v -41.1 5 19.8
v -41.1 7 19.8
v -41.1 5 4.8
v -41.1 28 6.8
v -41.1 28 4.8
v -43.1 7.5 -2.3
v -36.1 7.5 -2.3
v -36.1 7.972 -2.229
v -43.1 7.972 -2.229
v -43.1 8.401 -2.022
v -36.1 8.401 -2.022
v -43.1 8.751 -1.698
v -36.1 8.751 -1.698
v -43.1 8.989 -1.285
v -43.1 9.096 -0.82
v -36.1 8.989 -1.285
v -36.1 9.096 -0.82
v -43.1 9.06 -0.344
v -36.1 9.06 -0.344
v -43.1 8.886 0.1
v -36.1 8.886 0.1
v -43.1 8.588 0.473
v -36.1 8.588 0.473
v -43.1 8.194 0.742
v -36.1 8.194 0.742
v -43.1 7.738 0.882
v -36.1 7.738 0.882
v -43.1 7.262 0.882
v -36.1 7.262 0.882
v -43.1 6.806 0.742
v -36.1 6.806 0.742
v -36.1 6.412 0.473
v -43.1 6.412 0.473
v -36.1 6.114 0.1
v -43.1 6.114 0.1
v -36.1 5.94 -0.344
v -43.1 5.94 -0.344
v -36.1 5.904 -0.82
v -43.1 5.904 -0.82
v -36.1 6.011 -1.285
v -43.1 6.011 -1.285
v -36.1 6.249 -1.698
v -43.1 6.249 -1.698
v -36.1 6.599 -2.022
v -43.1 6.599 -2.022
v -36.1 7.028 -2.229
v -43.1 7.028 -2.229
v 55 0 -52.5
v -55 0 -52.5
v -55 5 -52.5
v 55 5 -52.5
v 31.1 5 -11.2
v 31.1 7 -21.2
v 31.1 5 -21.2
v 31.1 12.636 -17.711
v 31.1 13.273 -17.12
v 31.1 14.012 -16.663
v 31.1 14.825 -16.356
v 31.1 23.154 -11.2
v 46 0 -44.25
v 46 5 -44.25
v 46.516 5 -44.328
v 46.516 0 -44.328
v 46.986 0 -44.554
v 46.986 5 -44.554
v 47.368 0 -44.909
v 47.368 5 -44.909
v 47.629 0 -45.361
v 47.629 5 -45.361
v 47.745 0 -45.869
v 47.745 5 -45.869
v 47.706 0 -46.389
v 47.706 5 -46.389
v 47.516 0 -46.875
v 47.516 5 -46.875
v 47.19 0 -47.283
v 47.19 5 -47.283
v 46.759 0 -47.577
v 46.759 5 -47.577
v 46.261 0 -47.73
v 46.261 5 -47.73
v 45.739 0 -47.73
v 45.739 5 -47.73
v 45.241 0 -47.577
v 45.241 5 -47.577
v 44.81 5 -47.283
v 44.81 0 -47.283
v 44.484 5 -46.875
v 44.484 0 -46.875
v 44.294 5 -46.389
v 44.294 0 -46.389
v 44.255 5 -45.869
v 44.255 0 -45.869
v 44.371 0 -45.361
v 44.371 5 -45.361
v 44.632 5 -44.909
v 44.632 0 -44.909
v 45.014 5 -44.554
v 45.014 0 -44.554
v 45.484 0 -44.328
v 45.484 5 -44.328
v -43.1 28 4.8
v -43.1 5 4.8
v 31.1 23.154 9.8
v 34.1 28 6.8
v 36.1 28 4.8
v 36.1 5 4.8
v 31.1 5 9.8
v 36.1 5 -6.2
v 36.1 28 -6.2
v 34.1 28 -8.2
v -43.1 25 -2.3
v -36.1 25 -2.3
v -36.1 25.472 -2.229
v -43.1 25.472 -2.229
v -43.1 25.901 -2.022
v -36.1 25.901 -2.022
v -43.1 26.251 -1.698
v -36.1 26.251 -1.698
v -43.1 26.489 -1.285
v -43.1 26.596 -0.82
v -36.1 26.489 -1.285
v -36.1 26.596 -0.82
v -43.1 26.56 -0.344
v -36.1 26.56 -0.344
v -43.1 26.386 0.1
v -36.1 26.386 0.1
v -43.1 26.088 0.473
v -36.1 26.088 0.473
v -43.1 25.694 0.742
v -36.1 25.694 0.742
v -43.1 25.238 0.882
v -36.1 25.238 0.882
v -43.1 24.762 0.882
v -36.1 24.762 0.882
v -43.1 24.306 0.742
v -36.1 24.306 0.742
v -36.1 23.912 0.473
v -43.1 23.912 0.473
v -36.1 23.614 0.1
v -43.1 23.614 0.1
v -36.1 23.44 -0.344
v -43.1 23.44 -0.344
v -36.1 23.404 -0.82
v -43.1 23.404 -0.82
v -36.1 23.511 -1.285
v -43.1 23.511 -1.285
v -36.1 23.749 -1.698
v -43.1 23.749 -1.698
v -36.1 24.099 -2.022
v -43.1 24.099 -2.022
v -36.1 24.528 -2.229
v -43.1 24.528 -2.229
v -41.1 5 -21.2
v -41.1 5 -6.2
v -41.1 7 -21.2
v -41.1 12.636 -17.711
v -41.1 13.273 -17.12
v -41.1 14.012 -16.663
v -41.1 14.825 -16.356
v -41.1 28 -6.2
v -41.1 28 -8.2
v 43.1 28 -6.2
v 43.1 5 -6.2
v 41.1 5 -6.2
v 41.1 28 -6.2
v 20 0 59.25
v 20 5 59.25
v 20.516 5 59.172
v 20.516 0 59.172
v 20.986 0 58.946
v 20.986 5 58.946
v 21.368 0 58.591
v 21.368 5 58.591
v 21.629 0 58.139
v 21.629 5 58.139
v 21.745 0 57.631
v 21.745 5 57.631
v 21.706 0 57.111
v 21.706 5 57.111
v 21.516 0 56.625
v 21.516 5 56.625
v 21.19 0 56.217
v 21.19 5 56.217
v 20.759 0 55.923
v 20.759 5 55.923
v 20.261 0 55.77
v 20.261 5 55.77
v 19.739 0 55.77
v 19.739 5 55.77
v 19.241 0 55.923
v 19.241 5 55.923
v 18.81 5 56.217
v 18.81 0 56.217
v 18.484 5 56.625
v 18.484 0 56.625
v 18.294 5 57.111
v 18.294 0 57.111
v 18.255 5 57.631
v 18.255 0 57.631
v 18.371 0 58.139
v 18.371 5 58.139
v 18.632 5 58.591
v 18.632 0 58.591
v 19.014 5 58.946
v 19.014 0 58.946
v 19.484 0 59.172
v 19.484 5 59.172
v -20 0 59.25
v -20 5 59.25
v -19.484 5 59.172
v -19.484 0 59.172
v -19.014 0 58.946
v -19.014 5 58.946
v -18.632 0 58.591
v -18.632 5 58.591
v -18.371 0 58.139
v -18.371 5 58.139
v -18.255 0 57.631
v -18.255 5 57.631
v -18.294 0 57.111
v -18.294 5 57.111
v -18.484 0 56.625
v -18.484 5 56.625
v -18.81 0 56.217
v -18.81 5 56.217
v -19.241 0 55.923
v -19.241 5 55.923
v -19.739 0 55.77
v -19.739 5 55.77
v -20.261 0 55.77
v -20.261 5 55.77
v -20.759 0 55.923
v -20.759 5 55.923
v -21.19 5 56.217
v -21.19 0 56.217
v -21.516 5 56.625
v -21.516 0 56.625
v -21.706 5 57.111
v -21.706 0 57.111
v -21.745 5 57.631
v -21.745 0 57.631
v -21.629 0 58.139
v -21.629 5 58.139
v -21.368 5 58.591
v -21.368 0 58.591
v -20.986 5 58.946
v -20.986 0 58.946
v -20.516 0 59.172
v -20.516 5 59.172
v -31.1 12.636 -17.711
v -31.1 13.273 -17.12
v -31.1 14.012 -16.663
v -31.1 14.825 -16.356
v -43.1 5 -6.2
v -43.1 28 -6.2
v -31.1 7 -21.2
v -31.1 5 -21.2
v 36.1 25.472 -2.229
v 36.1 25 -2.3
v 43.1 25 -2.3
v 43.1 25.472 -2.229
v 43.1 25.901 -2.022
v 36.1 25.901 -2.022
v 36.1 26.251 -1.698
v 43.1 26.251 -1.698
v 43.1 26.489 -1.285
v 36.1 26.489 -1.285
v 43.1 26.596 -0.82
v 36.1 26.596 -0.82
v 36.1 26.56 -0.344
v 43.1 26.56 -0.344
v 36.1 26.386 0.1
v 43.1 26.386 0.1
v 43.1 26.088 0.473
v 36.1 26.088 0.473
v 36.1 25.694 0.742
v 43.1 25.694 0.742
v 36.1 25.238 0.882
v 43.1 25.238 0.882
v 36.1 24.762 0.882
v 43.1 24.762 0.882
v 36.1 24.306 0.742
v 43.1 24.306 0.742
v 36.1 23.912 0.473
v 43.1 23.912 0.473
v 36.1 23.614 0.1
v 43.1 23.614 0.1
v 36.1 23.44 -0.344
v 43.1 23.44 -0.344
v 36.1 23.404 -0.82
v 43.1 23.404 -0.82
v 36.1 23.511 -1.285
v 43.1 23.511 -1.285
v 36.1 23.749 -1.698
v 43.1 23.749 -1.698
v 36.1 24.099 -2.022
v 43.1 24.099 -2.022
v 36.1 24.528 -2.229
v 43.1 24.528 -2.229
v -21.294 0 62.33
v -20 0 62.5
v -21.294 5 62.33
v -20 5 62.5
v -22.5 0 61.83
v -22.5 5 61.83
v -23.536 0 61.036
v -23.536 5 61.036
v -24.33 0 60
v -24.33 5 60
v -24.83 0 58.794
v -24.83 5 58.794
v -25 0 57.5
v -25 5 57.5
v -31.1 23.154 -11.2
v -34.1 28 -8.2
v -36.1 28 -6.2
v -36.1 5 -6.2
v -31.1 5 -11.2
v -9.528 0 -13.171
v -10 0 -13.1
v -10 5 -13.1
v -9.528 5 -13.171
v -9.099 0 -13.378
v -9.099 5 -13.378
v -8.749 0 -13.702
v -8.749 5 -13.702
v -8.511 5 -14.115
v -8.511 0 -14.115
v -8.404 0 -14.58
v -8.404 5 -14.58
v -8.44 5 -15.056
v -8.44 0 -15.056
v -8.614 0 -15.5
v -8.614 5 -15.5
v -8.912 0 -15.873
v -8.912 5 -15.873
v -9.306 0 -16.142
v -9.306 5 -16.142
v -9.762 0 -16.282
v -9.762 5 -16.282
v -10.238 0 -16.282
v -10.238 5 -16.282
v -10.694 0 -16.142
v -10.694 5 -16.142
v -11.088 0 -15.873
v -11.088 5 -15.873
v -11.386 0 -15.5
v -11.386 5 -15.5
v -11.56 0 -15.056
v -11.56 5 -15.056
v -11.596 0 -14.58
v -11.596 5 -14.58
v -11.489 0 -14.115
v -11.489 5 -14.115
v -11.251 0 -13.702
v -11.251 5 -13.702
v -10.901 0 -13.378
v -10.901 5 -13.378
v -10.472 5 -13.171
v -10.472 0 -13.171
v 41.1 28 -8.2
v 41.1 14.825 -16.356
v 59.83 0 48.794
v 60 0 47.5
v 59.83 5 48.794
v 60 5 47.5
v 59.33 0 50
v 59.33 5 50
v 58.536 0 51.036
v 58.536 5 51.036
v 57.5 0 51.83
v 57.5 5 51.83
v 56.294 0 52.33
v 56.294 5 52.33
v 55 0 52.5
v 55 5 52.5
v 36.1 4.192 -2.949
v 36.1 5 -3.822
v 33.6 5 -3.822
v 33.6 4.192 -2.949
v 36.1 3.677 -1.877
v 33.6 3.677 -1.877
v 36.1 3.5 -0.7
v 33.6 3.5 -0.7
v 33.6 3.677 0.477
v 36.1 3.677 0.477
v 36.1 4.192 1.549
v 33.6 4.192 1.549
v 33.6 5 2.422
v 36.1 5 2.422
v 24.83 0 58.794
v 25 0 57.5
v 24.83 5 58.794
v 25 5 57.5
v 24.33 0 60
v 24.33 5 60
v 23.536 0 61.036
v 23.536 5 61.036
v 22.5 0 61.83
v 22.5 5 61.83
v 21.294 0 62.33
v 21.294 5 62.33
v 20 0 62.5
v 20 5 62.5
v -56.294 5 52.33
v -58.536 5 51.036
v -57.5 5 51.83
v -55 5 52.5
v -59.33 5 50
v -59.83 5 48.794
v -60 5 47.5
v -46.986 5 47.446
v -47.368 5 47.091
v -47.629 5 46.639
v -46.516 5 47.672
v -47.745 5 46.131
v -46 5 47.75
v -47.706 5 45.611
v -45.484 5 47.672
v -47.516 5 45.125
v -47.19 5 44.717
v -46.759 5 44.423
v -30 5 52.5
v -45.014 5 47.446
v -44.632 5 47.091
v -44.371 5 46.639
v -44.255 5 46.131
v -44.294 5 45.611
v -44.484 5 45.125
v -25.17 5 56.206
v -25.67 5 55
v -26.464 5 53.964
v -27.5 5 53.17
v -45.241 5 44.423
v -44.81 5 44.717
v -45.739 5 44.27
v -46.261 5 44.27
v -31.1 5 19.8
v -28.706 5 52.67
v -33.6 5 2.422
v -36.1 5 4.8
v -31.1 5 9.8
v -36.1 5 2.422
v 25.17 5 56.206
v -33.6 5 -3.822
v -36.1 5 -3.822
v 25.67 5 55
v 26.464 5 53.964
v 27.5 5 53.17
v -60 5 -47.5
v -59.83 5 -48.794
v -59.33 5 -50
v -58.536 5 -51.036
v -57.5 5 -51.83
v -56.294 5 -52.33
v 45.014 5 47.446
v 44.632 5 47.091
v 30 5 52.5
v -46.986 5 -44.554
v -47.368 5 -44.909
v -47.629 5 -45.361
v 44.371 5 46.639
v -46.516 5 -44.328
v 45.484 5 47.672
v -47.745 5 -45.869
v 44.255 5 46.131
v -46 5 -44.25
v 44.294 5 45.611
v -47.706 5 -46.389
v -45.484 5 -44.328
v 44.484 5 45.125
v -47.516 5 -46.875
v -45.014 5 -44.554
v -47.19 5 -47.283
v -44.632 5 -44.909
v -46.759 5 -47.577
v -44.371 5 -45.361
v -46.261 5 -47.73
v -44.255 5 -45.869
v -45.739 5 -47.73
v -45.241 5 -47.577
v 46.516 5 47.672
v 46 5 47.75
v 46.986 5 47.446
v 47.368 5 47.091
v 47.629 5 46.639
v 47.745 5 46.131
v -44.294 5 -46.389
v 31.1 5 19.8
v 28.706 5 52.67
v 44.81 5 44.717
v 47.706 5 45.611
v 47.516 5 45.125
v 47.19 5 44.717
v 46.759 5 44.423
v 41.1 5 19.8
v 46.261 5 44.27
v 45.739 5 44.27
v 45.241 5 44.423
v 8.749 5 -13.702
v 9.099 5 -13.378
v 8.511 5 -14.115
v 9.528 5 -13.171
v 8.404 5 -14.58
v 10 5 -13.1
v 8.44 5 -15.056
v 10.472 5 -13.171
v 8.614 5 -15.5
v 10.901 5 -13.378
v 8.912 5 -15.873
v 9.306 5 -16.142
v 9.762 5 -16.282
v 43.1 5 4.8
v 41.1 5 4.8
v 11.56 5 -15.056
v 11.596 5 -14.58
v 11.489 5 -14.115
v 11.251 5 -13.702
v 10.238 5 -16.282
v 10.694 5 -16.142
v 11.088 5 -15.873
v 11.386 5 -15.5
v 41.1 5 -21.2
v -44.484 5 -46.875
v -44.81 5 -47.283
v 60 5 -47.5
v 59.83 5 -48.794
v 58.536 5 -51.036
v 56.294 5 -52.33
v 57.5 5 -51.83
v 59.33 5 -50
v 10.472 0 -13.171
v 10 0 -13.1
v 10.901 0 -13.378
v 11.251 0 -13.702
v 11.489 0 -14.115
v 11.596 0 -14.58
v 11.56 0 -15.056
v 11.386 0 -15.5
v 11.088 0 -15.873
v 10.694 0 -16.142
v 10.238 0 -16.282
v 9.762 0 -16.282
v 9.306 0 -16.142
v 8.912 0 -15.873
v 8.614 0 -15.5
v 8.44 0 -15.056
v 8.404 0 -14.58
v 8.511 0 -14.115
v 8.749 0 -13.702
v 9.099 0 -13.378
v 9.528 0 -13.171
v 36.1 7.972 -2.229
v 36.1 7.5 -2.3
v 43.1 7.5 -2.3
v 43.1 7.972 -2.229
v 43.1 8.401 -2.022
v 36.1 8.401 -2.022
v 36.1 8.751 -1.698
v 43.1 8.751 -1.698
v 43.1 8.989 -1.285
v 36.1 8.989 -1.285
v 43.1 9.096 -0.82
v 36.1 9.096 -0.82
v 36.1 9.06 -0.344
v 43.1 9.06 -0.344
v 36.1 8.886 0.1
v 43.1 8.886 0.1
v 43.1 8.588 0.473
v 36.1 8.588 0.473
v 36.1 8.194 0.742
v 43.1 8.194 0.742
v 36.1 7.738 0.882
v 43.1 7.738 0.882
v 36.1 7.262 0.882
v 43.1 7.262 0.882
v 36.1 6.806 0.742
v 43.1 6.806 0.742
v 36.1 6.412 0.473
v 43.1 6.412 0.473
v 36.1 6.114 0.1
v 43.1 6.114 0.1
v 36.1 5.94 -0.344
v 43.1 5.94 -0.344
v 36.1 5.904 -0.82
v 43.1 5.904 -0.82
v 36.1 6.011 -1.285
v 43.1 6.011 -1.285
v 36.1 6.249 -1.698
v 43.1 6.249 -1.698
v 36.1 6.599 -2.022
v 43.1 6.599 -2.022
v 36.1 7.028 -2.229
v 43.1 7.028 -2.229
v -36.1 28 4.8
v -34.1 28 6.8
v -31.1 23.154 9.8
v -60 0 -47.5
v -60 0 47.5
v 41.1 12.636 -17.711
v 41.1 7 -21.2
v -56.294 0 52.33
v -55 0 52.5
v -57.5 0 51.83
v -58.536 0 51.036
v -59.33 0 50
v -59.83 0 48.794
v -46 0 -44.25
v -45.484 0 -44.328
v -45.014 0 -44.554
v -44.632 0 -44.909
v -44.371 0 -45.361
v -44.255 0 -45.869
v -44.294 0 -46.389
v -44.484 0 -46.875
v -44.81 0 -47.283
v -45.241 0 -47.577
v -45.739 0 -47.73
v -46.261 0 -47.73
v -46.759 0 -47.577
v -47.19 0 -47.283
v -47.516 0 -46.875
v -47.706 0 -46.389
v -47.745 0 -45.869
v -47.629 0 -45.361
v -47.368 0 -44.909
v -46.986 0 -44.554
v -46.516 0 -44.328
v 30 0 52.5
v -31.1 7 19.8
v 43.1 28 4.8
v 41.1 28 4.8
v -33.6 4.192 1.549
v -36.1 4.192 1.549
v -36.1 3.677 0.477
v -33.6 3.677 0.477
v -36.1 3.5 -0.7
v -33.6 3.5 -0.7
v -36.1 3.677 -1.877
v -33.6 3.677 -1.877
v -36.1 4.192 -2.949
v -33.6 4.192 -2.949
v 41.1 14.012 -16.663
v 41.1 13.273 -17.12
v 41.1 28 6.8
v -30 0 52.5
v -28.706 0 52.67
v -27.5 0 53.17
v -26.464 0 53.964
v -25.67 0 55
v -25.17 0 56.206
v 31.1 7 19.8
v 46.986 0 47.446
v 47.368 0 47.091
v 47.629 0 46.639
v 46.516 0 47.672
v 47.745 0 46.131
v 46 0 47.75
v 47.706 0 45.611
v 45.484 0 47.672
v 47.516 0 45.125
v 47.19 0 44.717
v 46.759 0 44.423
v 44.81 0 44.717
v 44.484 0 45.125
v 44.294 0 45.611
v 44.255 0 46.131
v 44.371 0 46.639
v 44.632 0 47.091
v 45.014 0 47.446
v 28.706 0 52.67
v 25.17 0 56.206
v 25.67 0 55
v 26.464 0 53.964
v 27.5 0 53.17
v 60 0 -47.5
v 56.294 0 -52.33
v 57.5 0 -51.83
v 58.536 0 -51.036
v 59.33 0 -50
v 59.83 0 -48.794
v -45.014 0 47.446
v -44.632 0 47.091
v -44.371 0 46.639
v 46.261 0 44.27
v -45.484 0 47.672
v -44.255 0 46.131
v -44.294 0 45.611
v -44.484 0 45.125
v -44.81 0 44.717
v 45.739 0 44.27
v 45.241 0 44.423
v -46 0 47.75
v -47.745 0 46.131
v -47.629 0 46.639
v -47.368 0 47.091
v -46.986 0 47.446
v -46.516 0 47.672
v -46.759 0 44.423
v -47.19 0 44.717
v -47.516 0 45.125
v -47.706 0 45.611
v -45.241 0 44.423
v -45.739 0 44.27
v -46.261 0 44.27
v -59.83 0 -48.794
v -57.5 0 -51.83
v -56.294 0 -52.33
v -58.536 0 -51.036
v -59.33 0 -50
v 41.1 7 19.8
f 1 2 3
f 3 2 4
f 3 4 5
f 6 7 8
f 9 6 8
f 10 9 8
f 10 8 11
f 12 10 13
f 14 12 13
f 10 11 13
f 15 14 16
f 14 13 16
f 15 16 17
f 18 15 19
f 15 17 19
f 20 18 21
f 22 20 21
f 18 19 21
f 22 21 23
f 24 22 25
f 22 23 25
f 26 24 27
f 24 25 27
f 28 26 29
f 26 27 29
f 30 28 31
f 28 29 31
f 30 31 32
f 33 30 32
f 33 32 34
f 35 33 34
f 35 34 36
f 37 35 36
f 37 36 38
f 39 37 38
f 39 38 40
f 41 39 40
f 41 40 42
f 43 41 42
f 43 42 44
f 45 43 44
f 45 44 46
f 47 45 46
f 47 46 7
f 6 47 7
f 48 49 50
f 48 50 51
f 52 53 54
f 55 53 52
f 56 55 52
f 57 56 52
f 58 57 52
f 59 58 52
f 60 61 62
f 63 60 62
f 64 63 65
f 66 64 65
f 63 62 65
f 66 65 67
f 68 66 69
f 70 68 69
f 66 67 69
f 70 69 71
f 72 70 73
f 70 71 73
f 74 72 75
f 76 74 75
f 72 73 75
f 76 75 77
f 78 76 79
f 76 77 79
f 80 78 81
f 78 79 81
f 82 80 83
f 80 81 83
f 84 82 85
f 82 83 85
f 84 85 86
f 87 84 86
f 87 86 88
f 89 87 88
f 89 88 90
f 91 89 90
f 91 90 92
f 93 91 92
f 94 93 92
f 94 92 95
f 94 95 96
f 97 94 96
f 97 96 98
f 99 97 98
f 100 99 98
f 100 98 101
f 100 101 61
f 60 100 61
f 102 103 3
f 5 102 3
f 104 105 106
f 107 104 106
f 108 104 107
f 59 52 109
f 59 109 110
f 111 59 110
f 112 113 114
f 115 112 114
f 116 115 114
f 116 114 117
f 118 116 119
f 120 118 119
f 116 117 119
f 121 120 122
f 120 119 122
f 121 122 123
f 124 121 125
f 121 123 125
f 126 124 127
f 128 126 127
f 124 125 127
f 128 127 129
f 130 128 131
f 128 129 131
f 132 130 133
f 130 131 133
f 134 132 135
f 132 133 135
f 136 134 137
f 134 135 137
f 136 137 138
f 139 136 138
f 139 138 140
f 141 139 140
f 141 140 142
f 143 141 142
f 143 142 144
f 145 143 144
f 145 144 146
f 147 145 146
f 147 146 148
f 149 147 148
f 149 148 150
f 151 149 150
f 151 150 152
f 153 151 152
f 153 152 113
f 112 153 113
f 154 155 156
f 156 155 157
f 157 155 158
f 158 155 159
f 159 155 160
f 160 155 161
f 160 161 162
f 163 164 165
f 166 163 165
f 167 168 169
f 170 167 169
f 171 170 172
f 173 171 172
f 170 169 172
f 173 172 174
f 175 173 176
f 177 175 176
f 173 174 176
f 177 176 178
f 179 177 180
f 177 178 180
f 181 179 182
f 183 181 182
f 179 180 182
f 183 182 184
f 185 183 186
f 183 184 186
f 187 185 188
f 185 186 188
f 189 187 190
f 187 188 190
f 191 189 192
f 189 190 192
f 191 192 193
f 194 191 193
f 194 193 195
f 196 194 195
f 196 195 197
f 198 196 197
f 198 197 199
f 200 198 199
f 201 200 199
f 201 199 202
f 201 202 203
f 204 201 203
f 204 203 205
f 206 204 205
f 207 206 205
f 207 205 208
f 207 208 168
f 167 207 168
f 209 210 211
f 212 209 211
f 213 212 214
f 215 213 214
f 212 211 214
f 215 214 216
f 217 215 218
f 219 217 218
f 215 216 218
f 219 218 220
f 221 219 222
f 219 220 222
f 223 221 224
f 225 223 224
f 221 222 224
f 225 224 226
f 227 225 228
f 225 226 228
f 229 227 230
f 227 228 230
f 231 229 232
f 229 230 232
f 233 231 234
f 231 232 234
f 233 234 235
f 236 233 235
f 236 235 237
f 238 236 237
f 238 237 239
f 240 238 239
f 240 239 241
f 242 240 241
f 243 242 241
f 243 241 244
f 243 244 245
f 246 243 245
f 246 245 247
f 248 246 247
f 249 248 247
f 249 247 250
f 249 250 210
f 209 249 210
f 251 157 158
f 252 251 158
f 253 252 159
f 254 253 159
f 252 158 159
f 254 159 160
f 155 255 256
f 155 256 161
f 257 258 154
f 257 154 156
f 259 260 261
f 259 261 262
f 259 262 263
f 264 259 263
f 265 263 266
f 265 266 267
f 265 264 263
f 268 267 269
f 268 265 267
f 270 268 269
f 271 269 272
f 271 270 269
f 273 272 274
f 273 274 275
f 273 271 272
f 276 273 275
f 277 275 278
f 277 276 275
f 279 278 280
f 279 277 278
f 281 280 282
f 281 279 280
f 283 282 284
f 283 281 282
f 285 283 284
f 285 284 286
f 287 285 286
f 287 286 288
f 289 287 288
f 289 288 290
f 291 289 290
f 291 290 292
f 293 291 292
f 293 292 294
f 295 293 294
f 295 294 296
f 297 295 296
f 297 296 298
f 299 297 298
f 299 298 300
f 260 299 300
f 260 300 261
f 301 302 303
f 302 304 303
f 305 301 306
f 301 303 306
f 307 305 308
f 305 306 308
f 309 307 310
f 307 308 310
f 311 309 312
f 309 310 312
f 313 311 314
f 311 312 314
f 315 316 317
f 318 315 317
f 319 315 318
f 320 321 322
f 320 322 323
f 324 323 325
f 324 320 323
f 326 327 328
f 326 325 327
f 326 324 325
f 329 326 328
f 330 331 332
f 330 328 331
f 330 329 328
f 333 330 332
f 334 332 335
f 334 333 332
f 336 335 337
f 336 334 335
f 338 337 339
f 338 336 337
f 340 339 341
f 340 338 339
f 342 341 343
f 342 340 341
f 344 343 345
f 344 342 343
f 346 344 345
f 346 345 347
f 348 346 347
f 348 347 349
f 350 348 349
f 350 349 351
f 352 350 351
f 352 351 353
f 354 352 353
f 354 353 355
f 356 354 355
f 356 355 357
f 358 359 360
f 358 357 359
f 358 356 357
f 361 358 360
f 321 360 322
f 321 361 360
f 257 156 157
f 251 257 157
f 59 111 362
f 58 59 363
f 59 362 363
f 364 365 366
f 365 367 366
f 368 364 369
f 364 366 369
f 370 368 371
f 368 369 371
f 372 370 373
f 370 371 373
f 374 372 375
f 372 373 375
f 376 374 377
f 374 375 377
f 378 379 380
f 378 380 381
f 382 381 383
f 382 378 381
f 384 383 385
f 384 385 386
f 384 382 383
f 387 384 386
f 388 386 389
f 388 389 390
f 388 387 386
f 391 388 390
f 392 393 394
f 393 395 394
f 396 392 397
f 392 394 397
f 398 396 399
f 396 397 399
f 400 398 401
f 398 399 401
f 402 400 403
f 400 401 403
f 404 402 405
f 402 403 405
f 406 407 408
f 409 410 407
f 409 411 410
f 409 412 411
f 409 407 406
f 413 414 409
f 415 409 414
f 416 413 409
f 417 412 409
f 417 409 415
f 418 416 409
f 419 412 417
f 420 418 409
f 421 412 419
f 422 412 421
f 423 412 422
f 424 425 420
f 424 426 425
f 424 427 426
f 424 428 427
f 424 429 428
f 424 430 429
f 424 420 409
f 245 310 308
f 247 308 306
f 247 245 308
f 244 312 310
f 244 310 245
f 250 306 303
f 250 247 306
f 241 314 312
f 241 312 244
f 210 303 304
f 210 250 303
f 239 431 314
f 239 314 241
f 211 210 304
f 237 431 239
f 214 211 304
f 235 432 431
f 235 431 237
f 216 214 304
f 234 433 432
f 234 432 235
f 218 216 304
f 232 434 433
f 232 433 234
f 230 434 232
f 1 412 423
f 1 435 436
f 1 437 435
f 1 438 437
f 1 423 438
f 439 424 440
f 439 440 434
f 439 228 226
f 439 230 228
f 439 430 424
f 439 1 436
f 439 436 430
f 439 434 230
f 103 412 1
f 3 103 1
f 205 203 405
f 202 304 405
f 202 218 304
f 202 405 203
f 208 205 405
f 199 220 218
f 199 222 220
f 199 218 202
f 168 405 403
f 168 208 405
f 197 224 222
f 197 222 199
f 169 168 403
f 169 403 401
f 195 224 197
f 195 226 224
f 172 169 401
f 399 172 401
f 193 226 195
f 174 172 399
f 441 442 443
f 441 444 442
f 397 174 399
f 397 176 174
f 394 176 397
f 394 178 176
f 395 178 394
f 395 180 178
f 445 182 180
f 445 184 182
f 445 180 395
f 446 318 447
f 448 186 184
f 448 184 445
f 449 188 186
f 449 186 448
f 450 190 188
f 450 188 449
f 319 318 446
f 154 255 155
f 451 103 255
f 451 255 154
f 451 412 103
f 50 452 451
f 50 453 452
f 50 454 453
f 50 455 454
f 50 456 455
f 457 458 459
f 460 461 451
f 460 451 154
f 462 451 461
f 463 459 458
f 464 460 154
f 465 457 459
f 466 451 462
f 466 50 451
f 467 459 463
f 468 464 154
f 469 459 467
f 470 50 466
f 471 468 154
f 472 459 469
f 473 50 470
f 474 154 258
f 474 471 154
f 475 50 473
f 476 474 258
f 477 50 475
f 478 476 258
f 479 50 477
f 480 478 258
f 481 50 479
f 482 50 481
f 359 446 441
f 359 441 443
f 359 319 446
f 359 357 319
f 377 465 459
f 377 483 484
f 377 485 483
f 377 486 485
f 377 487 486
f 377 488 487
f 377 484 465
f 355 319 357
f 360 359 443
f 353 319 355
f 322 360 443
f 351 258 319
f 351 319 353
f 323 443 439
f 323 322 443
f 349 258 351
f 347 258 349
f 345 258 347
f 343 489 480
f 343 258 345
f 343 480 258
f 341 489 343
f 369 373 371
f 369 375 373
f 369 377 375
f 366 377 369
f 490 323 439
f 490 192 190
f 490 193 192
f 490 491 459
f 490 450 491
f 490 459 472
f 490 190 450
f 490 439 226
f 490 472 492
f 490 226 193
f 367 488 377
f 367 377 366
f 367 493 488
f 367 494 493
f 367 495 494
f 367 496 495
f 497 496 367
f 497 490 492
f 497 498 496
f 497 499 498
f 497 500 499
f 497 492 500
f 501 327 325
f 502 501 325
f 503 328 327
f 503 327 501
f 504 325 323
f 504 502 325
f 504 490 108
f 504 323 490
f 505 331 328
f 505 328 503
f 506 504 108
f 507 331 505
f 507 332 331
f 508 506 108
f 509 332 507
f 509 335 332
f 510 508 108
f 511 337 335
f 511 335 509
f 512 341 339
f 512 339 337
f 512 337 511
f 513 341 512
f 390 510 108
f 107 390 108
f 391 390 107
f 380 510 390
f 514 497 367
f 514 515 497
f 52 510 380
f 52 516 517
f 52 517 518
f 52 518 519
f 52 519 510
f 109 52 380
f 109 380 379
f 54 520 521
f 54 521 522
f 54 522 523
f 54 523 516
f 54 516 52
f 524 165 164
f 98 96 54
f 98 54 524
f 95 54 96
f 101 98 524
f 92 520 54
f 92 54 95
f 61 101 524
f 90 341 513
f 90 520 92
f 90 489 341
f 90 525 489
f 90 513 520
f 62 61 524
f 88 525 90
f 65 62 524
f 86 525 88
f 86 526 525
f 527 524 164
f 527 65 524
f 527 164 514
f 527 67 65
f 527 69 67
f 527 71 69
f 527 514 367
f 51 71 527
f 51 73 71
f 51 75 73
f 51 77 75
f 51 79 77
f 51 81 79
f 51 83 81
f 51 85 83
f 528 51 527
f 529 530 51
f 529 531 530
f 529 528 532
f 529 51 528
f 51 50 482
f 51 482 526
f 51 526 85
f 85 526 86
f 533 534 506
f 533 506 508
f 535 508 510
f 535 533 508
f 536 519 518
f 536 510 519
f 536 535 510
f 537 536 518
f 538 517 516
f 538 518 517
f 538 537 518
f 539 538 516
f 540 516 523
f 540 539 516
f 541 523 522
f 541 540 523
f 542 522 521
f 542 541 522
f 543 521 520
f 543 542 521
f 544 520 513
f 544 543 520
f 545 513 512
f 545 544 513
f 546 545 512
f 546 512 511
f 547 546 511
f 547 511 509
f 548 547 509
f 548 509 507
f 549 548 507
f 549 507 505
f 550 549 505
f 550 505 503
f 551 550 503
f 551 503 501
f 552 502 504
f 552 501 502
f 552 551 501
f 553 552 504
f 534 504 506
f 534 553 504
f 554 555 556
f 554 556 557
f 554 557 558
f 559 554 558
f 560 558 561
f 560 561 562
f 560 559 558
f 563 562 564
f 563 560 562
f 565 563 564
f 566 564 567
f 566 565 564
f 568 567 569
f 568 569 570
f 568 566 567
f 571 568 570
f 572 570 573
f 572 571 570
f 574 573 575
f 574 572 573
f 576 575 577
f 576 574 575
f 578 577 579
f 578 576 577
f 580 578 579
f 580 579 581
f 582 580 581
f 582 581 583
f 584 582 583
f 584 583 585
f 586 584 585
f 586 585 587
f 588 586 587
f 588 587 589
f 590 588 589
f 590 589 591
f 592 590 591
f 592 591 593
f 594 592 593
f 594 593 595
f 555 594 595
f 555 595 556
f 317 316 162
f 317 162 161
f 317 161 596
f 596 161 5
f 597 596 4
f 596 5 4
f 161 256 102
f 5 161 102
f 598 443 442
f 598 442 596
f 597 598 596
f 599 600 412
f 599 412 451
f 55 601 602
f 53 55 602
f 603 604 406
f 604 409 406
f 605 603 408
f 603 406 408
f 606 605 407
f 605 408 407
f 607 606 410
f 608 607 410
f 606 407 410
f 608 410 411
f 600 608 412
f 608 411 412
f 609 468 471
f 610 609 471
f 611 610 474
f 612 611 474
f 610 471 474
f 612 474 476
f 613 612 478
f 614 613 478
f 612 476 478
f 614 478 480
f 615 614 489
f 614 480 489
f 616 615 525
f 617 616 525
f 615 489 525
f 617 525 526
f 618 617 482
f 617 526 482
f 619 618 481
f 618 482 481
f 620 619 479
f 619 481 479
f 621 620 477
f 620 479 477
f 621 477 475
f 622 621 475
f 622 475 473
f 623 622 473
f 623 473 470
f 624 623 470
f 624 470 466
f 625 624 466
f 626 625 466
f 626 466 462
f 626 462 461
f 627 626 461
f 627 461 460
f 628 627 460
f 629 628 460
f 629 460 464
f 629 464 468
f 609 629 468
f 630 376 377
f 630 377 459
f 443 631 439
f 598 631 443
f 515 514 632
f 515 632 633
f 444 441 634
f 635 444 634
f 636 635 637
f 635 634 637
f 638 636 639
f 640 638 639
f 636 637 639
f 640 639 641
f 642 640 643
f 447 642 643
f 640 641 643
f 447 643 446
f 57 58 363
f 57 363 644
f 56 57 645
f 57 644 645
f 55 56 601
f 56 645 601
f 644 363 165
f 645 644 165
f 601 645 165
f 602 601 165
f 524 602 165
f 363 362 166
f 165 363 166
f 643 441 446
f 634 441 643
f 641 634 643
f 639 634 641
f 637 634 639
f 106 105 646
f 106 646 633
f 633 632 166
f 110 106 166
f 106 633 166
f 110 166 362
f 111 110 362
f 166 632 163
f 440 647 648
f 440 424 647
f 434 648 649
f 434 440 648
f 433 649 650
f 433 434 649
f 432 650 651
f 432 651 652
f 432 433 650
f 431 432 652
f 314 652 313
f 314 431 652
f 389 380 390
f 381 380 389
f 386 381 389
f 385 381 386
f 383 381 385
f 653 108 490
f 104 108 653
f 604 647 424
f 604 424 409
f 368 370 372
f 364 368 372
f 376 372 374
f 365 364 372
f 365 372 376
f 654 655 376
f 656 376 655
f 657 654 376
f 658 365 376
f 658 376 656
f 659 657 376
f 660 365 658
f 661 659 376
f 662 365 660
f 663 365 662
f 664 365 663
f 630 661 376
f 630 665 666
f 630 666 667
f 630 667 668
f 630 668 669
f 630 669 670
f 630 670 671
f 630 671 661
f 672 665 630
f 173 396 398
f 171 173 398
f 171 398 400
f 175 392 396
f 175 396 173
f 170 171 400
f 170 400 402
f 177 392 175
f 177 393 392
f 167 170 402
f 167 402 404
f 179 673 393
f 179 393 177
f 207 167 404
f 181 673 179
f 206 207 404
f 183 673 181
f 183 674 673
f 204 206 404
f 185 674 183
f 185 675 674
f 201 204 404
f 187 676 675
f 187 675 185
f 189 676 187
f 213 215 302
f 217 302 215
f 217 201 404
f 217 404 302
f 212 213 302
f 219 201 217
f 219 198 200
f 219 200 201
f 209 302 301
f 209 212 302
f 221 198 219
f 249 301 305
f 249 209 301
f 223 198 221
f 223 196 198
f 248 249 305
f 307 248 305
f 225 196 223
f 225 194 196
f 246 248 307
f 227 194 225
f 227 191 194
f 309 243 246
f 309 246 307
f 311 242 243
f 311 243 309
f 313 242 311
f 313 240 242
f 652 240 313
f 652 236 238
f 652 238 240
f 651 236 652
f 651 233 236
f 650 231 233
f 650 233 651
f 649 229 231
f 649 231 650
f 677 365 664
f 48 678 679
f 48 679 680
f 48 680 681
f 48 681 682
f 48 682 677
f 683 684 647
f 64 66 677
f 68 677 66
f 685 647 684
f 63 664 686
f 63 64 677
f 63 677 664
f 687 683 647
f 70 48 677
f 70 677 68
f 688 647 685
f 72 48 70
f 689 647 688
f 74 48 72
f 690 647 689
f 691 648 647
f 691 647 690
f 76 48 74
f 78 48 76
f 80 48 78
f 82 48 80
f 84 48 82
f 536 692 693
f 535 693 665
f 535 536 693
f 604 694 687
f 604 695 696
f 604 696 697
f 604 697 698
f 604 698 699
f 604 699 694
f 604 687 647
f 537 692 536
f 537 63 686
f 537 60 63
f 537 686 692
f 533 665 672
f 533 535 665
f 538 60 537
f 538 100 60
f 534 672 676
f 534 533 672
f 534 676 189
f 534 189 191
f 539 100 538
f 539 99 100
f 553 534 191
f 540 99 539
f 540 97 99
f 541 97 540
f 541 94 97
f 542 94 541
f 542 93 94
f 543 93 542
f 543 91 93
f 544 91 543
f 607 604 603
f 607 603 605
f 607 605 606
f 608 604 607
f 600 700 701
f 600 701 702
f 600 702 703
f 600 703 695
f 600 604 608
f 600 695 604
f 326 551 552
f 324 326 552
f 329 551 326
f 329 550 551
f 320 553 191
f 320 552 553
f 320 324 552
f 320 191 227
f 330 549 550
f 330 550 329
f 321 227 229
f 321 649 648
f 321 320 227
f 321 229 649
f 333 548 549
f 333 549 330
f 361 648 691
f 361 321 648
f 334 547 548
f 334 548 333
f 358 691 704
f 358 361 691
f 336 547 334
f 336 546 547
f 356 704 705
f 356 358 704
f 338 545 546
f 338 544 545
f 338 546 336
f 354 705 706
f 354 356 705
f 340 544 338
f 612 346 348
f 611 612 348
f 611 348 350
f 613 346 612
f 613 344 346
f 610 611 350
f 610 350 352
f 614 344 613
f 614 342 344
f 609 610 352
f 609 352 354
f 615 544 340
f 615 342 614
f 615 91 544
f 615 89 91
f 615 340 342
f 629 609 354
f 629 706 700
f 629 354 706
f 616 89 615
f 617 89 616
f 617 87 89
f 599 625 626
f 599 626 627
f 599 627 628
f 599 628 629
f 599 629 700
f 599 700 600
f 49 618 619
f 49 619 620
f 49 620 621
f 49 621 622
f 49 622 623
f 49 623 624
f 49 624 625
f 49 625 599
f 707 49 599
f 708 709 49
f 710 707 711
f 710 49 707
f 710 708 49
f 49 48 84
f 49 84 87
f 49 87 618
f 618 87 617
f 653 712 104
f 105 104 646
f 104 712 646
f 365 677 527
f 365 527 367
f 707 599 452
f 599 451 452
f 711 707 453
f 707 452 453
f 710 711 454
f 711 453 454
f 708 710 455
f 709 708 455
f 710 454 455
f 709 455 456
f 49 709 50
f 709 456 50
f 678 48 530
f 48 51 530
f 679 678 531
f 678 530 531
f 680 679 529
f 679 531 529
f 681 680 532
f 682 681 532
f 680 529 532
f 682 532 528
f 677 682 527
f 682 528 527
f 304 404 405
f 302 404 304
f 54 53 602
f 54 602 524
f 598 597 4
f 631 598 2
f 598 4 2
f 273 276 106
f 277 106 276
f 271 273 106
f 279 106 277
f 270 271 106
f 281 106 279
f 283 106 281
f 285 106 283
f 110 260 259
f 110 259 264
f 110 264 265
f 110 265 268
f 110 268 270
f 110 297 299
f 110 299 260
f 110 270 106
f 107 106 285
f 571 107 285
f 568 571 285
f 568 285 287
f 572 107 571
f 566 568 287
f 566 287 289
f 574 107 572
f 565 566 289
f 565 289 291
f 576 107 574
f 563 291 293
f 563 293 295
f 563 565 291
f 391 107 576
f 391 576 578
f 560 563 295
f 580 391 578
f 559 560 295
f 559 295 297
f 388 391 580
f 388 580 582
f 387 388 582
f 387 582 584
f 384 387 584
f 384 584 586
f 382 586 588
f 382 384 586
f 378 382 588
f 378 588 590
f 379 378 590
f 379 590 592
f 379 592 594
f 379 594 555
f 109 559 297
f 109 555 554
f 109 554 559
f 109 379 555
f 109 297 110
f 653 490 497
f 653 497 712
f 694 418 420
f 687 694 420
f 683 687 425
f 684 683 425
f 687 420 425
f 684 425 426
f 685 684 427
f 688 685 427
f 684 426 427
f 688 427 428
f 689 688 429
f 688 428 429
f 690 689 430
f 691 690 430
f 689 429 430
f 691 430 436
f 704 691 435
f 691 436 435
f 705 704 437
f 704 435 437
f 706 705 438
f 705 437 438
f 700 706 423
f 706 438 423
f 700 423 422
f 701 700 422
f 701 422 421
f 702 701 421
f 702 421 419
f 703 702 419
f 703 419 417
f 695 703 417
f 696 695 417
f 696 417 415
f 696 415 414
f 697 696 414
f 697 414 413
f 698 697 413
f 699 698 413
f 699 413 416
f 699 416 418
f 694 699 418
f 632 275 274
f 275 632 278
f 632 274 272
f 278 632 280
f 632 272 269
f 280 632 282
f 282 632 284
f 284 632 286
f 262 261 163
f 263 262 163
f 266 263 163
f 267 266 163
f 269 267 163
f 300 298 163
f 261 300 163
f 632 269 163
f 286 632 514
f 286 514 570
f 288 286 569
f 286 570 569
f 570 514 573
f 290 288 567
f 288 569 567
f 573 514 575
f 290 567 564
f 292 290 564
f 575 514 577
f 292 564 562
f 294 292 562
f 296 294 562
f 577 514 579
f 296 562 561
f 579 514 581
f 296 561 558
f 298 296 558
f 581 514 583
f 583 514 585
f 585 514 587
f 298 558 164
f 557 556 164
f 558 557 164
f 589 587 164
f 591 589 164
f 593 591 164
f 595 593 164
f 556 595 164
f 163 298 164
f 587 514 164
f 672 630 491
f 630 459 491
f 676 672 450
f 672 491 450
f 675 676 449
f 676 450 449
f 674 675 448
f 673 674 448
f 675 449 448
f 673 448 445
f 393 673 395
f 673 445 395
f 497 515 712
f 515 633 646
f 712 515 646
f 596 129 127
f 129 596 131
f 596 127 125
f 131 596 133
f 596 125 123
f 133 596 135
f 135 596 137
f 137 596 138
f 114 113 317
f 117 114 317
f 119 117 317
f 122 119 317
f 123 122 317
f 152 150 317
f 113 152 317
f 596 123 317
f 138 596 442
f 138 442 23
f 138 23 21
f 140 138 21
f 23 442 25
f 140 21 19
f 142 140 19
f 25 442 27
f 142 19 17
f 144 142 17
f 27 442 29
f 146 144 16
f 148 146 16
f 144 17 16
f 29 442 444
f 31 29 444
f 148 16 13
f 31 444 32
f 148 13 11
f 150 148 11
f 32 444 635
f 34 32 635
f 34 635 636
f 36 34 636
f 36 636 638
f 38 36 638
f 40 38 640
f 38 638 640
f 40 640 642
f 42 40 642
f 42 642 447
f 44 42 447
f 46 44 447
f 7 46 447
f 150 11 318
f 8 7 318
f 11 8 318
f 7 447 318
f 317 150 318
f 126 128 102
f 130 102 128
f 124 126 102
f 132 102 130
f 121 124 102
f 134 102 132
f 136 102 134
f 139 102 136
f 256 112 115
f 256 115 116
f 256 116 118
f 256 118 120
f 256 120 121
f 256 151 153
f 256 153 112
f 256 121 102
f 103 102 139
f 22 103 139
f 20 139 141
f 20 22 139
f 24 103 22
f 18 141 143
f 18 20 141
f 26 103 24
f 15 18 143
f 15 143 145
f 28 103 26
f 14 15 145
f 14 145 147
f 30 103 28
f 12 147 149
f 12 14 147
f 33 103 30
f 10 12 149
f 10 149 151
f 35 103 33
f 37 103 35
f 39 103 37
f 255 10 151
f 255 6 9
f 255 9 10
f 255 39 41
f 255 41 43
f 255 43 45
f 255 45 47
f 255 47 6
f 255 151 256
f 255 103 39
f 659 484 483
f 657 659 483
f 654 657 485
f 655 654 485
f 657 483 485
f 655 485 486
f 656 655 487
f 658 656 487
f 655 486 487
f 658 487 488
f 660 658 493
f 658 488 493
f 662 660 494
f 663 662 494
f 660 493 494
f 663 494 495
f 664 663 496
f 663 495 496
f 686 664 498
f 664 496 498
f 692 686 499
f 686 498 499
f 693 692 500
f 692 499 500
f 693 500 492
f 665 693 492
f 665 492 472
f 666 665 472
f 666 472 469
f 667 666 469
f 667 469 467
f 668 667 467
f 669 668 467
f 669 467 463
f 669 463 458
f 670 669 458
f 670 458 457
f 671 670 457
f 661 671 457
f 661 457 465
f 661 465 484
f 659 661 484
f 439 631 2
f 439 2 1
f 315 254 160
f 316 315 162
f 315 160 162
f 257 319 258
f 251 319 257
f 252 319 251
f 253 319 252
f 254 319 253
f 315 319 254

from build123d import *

# Parameters (mm, degrees)
EXTRUDE_1_DEPTH         = 5
FILLET_1_R              = 5
SKETCH_2_W              = 7
SKETCH_2_H              = 11
EXTRUDE_2_DEPTH         = 23
SKETCH_3_R              = 1.6
CUT_EXTRUDE_1_DEPTH     = 119.006186279
SKETCH_5_R              = 1.75
CUT_EXTRUDE_3_DEPTH     = 90.639556001
SKETCH_6_R              = 1.75
CUT_EXTRUDE_4_DEPTH     = 90.639556001
SKETCH2_R               = 4
CUT_EXTRUDE1_DEPTH      = 2.5
CUT_EXTRUDE2_START      = 2.5
SKETCH3_R               = 4
CUT_EXTRUDE2_DEPTH      = 2.5
CUT_EXTRUDE3_DEPTH      = 90.639556001
CUT_EXTRUDE3_DEPTH_BACK = 90.639556001
SKETCH4_R               = 1.6
EXTRUDE_4_DEPTH         = 5
EXTRUDE_4_DEPTH_BACK    = 5
EXTRUDE_5_DEPTH         = 5
EXTRUDE_5_DEPTH_BACK    = 5
CHAMFER_1_SIZE          = 5
SKETCH_12_R             = 1.6
EXTRUDE_6_DEPTH         = 5


with BuildPart() as part:
    # 스케치1 → 보스-돌출1 (new body)
    with BuildSketch(Plane(origin=(0, 0, 0), x_dir=(1, 0, 0), z_dir=(0, 1, 0))):
        Polygon((-25, -52.5), (-60, -52.5), (-60, 52.5), (60, 52.5), (60, -52.5), (25, -52.5), (25, -62.5), (-25, -62.5), align=None)
    extrude(amount=EXTRUDE_1_DEPTH)

    # 필렛1
    fillet_1_edges = [part.edges().sort_by_distance(p)[0] for p in [
        (60, 2.5, -52.5),
        (60, 2.5, 52.5),
        (-60, 2.5, -52.5),
        (-60, 2.5, 52.5),
        (-25, 2.5, 52.5),
        (25, 2.5, 52.5),
        (25, 2.5, 62.5),
        (-25, 2.5, 62.5),
    ]]
    fillet(fillet_1_edges, radius=FILLET_1_R - 0.0001)  # a hair under: the kernel refuses the full size

    # 스케치5 → 컷-돌출3 (cut, through all)
    with BuildSketch(Plane(origin=(0, 5, 0), x_dir=(1, 0, 0), z_dir=(0, 1, 0))):
        with Locations(Location((-46, -46, 0), (0, 0, 270))):
            Circle(SKETCH_5_R)
        with Locations(Location((-46, 46, 0), (0, 0, 270))):
            Circle(SKETCH_5_R)
        with Locations(Location((46, 46, 0), (0, 0, 270))):
            Circle(SKETCH_5_R)
        with Locations(Location((46, -46, 0), (0, 0, 270))):
            Circle(SKETCH_5_R)
    extrude(amount=-CUT_EXTRUDE_3_DEPTH, mode=Mode.SUBTRACT)

    # 스케치6 → 컷-돌출4 (cut, through all)
    with BuildSketch(Plane(origin=(0, 5, 0), x_dir=(1, 0, 0), z_dir=(0, 1, 0))):
        with Locations(Location((20, -57.5, 0), (0, 0, 270))):
            Circle(SKETCH_6_R)
        with Locations(Location((-20, -57.5, 0), (0, 0, 270))):
            Circle(SKETCH_6_R)
    extrude(amount=-CUT_EXTRUDE_4_DEPTH, mode=Mode.SUBTRACT)

    # Sketch2 → Cut-Extrude1 (cut)
    with BuildSketch(Plane.ZY.offset(-36.1)):
        with Locations((-0.7, 7.5)):
            Circle(SKETCH2_R)
    extrude(amount=CUT_EXTRUDE1_DEPTH, mode=Mode.SUBTRACT)

    # Sketch3 → Cut-Extrude2 (cut)
    with BuildSketch(Plane(origin=(-36.1, 0, 0), x_dir=(0, 0, -1), z_dir=(1, 0, 0)).offset(CUT_EXTRUDE2_START)):
        with Locations((0.7, 7.5)):
            Circle(SKETCH3_R)
    extrude(amount=-CUT_EXTRUDE2_DEPTH, mode=Mode.SUBTRACT)

    # Sketch4 → Cut-Extrude3 (cut, two sides: drawn at the far end of the back side and taken through both)
    with BuildSketch(Plane(origin=(0, 5, 0), x_dir=(1, 0, 0), z_dir=(0, 1, 0)).offset(-CUT_EXTRUDE3_DEPTH_BACK)):
        with Locations(Location((-10, 0, 0), (0, 0, 270))):
            Circle(SKETCH4_R)
        with Locations(Location((10, 0, 0), (0, 0, 270))):
            Circle(SKETCH4_R)
        with Locations(Location((-10, 14.7, 0), (0, 0, 270))):
            Circle(SKETCH4_R)
        with Locations(Location((10, 14.7, 0), (0, 0, 270))):
            Circle(SKETCH4_R)
    extrude(amount=CUT_EXTRUDE3_DEPTH + CUT_EXTRUDE3_DEPTH_BACK, mode=Mode.SUBTRACT)



with BuildPart() as body_2:
    # 스케치2 → 보스-돌출2 (new body)
    with BuildSketch(Plane(origin=(0, 5, 0), x_dir=(1, 0, 0), z_dir=(0, 1, 0))):
        with Locations((-39.6, 0.7)):
            Rectangle(SKETCH_2_W, SKETCH_2_H)
    extrude(amount=EXTRUDE_2_DEPTH)

    # 스케치3 → 컷-돌출1 (cut, through all)
    with BuildSketch(Plane(origin=(-36.1, 0, 0), x_dir=(0, 0, -1), z_dir=(1, 0, 0))):
        with Locations((0.7, 25)):
            Circle(SKETCH_3_R)
        with Locations((0.7, 7.5)):
            Circle(SKETCH_3_R)
    extrude(amount=-CUT_EXTRUDE_1_DEPTH, mode=Mode.SUBTRACT)


with BuildPart() as body_3:
    # 대칭 복사1: mirrored copy
    add(body_2.part.mirror(Plane(origin=(0, 0, 0), x_dir=(0, 0, 1), z_dir=(1, 0, 0))))


with BuildPart() as part_1:
    add(part.part)

    add(body_2.part)  # 보스-돌출4 merges body 2
    # 스케치9 → 보스-돌출4 (add, two sides: drawn at the far end of the back side and taken through both)
    with BuildSketch(Plane(origin=(-36.1, 0, 0), x_dir=(0, 0, -1), z_dir=(1, 0, 0)).offset(-EXTRUDE_4_DEPTH_BACK)):
        Polygon((-19.8, 5), (-4.8, 5), (-4.8, 28), (-6.8, 28), (-19.8, 7), align=None)
        with BuildLine():
            Line((16.356233456, 14.824545956), (8.2, 28))
            Line((8.2, 28), (6.2, 28))
            Line((6.2, 28), (6.2, 5))
            Line((6.2, 5), (21.2, 5))
            Line((21.2, 5), (21.2, 7))
            Line((21.2, 7), (17.710979659, 12.636109782))
            ThreePointArc((17.710979659, 12.636109782), (16.87380684, 13.631404234), (16.356233456, 14.824545956))
        make_face()
    extrude(amount=EXTRUDE_4_DEPTH + EXTRUDE_4_DEPTH_BACK)


    add(body_3.part)  # 보스-돌출5 merges body 3
    # 스케치10 → 보스-돌출5 (add, two sides: drawn at the far end of the back side and taken through both)
    with BuildSketch(Plane.ZY.offset(-36.1).offset(-EXTRUDE_5_DEPTH_BACK)):
        with BuildLine():
            Line((-21.2, 5), (-6.2, 5))
            Line((-6.2, 5), (-6.2, 28))
            Line((-6.2, 28), (-8.2, 28))
            Line((-8.2, 28), (-16.356233456, 14.824545956))
            ThreePointArc((-16.356233456, 14.824545956), (-16.87380684, 13.631404234), (-17.710979659, 12.636109782))
            Line((-17.710979659, 12.636109782), (-21.2, 7))
            Line((-21.2, 7), (-21.2, 5))
        make_face()
        Polygon((6.8, 28), (4.8, 28), (4.8, 5), (19.8, 5), (19.8, 7), align=None)
    extrude(amount=EXTRUDE_5_DEPTH + EXTRUDE_5_DEPTH_BACK)

    # 모따기1
    chamfer_1_edges = [part_1.edges().sort_by_distance(p)[0] for p in [
        (31.1, 16.5, 4.8),
        (31.1, 16.5, -6.2),
        (-31.1, 16.5, 4.8),
        (-31.1, 16.5, -6.2),
    ]]
    chamfer(chamfer_1_edges, length=CHAMFER_1_SIZE - 0.0001)  # a hair under: the kernel refuses the full size

    # 스케치12 → 보스-돌출6 (add)
    with BuildSketch(Plane(origin=(0, 5, 0), x_dir=(1, 0, 0), z_dir=(0, 1, 0))):
        with Locations((-10, 0)):
            Circle(SKETCH_12_R)
        with Locations((10, 0)):
            Circle(SKETCH_12_R)
    extrude(amount=-EXTRUDE_6_DEPTH)


solid = part_1.part
